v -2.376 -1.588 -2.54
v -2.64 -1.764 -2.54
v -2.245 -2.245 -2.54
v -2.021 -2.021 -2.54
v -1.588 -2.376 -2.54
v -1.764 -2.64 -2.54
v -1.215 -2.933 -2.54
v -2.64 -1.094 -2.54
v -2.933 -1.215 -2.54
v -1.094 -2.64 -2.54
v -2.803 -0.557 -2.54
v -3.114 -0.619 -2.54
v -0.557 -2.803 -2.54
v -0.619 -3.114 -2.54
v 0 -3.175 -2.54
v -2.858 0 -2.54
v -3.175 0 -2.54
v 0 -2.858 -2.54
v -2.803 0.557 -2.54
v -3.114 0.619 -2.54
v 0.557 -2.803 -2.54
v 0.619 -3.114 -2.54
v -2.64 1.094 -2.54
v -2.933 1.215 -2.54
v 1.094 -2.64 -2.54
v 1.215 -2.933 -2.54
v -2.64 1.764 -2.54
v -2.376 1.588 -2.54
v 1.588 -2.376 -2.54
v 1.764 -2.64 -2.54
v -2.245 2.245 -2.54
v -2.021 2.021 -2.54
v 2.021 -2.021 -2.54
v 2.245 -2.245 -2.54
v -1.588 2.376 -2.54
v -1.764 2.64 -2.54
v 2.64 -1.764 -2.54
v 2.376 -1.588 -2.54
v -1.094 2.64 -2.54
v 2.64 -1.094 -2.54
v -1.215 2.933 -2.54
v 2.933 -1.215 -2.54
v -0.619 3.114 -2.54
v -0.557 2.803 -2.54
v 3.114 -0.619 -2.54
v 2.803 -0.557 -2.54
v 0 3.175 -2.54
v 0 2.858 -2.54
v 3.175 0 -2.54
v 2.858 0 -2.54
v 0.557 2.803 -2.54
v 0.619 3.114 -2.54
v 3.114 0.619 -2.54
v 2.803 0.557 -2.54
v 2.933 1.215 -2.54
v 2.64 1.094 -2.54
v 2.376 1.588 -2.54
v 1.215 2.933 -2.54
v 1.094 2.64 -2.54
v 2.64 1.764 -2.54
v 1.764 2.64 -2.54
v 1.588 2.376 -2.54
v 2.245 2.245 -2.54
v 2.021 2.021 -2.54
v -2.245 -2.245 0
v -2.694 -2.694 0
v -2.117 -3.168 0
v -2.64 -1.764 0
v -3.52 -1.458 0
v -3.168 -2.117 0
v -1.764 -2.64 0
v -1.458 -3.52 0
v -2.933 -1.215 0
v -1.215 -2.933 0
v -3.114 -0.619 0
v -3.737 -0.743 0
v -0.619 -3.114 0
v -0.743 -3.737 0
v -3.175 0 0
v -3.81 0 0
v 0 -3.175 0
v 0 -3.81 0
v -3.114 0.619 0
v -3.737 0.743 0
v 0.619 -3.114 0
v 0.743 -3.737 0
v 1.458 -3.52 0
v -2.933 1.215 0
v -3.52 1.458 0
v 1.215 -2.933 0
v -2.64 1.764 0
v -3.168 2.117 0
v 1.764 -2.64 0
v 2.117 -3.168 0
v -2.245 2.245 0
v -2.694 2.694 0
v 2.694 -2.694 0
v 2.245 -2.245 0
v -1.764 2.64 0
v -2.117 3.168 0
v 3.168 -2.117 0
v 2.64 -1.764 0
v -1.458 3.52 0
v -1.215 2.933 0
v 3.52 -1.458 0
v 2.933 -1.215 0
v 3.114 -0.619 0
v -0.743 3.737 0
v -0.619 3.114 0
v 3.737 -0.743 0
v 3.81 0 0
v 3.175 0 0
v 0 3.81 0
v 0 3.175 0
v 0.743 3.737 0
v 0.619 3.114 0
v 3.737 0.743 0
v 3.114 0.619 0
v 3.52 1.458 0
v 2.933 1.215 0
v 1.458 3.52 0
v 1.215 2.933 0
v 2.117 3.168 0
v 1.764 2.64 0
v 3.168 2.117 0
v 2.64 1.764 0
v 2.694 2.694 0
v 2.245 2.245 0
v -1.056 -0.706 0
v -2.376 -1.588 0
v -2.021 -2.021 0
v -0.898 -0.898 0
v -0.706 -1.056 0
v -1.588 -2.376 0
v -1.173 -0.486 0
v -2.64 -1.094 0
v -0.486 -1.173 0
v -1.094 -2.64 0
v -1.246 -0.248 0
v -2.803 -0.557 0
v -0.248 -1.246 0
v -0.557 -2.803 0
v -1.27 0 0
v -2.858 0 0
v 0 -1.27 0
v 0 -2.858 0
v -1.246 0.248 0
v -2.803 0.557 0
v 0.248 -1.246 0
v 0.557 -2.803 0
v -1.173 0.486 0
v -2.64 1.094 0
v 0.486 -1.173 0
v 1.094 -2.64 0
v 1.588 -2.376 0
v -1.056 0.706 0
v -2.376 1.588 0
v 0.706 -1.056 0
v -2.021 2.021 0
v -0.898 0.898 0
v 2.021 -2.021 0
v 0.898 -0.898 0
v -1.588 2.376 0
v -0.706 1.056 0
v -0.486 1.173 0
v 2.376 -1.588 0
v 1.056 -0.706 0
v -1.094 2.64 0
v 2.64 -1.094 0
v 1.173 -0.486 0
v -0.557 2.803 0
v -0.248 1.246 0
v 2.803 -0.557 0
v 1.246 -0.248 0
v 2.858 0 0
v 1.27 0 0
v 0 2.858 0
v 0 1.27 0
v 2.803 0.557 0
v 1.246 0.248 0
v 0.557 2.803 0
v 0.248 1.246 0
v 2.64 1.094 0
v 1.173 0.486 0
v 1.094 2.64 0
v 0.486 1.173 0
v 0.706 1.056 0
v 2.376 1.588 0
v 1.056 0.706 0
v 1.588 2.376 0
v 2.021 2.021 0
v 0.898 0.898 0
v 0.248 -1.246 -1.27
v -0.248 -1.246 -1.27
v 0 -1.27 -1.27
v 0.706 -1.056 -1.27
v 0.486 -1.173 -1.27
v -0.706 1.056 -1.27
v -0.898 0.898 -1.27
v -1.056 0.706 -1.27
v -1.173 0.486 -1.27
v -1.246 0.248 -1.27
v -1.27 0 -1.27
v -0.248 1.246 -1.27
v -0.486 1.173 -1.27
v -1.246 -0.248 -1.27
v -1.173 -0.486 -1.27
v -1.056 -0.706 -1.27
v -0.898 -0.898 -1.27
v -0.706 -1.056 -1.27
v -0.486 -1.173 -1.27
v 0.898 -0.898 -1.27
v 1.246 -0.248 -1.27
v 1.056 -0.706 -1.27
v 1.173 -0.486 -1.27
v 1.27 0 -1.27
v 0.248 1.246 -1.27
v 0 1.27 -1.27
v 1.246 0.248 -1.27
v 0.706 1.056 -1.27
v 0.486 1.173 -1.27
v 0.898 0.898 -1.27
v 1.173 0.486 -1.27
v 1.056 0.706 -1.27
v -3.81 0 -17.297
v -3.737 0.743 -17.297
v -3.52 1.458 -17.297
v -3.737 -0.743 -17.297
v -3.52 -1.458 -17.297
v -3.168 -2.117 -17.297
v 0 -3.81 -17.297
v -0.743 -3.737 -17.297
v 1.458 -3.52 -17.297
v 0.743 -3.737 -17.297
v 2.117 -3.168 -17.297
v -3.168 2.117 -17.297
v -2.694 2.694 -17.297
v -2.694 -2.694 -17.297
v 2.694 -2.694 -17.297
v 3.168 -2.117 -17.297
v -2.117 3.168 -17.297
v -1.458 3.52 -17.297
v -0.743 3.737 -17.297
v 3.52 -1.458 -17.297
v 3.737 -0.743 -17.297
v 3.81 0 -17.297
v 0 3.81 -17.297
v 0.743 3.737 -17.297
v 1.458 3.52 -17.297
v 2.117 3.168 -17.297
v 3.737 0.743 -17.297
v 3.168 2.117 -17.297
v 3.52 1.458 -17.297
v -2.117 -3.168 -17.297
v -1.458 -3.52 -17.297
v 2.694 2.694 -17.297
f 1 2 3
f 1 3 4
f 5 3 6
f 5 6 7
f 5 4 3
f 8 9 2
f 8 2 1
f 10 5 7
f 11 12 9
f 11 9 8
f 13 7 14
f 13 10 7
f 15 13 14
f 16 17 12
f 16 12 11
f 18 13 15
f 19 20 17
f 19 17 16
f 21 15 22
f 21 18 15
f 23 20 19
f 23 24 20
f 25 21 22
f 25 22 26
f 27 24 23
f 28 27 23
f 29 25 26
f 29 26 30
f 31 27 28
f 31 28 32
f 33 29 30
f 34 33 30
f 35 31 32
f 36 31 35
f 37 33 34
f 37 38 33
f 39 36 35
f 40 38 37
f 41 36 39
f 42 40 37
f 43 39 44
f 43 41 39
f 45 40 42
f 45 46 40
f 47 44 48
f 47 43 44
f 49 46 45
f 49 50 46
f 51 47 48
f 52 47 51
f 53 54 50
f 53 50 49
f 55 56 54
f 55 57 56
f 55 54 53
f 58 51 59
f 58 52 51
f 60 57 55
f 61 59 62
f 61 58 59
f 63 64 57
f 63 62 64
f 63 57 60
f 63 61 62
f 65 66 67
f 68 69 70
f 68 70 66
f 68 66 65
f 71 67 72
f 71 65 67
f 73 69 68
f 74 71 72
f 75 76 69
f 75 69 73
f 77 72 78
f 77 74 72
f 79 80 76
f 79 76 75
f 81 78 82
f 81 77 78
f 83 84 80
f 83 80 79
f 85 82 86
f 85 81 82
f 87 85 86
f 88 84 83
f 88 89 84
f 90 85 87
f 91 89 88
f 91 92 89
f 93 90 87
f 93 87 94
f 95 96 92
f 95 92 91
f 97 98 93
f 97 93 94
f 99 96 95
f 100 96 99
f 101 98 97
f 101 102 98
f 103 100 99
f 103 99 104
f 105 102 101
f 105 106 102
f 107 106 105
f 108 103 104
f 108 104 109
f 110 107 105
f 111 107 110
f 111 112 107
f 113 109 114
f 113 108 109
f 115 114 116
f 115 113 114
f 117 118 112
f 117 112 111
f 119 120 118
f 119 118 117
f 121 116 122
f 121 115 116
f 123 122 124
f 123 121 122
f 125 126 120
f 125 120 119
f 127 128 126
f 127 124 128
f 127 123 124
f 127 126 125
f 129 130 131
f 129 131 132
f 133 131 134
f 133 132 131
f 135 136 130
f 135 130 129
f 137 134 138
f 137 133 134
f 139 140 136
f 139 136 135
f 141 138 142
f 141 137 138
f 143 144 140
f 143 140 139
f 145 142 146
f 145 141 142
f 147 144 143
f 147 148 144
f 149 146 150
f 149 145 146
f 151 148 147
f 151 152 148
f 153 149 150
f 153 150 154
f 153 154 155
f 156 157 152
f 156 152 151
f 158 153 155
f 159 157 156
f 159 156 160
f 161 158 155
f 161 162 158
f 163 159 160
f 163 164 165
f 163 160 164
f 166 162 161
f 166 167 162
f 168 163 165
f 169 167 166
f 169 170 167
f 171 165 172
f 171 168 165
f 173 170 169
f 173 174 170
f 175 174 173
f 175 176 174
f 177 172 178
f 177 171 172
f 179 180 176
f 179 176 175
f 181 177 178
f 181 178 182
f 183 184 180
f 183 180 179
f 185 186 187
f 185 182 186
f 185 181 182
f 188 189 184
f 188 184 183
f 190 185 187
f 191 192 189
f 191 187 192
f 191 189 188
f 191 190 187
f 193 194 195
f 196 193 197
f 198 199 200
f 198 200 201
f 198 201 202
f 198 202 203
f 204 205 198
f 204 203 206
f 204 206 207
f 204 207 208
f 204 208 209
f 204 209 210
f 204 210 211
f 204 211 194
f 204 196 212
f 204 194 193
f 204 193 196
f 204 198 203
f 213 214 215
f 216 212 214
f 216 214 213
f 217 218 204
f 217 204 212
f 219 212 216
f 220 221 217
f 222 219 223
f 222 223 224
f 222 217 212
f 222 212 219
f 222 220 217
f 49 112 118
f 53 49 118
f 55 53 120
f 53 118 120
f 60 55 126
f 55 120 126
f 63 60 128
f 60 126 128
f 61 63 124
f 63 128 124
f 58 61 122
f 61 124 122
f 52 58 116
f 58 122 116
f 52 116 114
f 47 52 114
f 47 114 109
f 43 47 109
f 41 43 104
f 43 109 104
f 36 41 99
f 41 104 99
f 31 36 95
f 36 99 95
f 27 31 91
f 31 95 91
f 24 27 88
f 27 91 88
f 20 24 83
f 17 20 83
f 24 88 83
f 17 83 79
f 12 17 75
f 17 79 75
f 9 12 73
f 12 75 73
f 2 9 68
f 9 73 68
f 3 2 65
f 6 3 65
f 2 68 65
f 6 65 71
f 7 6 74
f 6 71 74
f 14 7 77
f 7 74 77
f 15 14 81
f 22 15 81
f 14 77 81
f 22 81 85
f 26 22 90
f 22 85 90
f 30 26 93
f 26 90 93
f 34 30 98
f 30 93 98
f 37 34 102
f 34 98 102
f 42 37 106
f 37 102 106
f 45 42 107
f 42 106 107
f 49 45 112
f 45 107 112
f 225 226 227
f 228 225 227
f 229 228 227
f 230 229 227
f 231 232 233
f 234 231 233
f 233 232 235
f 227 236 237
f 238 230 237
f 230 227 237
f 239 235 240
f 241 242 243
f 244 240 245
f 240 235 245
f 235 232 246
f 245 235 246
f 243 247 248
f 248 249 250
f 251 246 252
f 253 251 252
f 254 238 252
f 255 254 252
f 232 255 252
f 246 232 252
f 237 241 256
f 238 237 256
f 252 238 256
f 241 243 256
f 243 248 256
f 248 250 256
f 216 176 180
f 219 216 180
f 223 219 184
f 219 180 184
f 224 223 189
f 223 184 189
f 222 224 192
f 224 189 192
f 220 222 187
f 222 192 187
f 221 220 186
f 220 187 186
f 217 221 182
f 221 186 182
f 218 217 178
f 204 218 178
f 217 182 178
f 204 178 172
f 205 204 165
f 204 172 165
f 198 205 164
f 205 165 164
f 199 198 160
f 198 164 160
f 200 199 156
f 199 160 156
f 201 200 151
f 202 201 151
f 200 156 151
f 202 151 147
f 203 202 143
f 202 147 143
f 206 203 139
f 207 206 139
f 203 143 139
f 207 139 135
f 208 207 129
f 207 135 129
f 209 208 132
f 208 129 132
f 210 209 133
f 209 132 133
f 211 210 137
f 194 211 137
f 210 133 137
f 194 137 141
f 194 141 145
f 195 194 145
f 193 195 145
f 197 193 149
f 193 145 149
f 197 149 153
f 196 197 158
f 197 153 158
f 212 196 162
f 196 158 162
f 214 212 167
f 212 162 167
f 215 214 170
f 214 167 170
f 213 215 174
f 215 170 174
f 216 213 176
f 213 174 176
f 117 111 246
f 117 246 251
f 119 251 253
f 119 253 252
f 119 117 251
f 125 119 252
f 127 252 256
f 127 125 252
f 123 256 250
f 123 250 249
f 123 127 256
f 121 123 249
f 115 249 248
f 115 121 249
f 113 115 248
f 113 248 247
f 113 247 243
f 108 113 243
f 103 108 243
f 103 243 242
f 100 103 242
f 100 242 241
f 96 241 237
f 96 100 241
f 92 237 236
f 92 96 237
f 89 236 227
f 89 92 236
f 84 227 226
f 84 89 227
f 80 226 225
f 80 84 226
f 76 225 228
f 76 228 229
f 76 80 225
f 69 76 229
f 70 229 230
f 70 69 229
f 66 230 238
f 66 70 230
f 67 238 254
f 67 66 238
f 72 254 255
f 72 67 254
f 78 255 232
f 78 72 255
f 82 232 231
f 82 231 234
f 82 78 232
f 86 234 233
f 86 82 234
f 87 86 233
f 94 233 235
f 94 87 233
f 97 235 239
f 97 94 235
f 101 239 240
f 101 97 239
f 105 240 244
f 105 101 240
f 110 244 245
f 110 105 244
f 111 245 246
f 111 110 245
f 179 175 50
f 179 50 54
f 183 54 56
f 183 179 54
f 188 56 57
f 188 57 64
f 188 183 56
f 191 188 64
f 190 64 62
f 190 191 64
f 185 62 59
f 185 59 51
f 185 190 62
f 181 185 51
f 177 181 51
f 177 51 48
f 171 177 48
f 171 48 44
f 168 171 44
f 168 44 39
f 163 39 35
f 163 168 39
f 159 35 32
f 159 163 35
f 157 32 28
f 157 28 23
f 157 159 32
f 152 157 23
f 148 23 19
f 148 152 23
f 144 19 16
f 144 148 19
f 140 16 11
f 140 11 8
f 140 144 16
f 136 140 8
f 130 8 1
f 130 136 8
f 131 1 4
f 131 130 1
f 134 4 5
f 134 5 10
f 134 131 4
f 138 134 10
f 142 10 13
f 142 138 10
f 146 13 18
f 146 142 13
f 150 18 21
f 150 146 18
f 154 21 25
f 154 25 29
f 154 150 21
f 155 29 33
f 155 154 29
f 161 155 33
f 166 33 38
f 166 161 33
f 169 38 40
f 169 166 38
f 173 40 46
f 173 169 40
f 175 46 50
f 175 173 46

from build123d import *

# Parameters (mm, degrees)
SKETCH1_R           = 3.81
BOSS_EXTRUDE1_DEPTH = 17.2974
SKETCH1_6_R         = 3.175
SKETCH1_6_R_2       = 2.8575
CUT_EXTRUDE1_DEPTH  = 2.54
SKETCH1_7_R         = 1.27
CUT_EXTRUDE2_DEPTH  = 1.27


with BuildPart() as part:
    # Sketch1 → Boss-Extrude1 (new body)
    with BuildSketch(Plane.XY):
        Circle(SKETCH1_R)
    extrude(amount=-BOSS_EXTRUDE1_DEPTH)

    # Sketch1<6> → Cut-Extrude1 (cut)
    with BuildSketch(Plane.XY):
        Circle(SKETCH1_6_R)
        Circle(SKETCH1_6_R_2, mode=Mode.SUBTRACT)
    extrude(amount=-CUT_EXTRUDE1_DEPTH, mode=Mode.SUBTRACT)

    # Sketch1<7> → Cut-Extrude2 (cut)
    with BuildSketch(Plane.XY):
        Circle(SKETCH1_7_R)
    extrude(amount=-CUT_EXTRUDE2_DEPTH, mode=Mode.SUBTRACT)


solid = part.part
